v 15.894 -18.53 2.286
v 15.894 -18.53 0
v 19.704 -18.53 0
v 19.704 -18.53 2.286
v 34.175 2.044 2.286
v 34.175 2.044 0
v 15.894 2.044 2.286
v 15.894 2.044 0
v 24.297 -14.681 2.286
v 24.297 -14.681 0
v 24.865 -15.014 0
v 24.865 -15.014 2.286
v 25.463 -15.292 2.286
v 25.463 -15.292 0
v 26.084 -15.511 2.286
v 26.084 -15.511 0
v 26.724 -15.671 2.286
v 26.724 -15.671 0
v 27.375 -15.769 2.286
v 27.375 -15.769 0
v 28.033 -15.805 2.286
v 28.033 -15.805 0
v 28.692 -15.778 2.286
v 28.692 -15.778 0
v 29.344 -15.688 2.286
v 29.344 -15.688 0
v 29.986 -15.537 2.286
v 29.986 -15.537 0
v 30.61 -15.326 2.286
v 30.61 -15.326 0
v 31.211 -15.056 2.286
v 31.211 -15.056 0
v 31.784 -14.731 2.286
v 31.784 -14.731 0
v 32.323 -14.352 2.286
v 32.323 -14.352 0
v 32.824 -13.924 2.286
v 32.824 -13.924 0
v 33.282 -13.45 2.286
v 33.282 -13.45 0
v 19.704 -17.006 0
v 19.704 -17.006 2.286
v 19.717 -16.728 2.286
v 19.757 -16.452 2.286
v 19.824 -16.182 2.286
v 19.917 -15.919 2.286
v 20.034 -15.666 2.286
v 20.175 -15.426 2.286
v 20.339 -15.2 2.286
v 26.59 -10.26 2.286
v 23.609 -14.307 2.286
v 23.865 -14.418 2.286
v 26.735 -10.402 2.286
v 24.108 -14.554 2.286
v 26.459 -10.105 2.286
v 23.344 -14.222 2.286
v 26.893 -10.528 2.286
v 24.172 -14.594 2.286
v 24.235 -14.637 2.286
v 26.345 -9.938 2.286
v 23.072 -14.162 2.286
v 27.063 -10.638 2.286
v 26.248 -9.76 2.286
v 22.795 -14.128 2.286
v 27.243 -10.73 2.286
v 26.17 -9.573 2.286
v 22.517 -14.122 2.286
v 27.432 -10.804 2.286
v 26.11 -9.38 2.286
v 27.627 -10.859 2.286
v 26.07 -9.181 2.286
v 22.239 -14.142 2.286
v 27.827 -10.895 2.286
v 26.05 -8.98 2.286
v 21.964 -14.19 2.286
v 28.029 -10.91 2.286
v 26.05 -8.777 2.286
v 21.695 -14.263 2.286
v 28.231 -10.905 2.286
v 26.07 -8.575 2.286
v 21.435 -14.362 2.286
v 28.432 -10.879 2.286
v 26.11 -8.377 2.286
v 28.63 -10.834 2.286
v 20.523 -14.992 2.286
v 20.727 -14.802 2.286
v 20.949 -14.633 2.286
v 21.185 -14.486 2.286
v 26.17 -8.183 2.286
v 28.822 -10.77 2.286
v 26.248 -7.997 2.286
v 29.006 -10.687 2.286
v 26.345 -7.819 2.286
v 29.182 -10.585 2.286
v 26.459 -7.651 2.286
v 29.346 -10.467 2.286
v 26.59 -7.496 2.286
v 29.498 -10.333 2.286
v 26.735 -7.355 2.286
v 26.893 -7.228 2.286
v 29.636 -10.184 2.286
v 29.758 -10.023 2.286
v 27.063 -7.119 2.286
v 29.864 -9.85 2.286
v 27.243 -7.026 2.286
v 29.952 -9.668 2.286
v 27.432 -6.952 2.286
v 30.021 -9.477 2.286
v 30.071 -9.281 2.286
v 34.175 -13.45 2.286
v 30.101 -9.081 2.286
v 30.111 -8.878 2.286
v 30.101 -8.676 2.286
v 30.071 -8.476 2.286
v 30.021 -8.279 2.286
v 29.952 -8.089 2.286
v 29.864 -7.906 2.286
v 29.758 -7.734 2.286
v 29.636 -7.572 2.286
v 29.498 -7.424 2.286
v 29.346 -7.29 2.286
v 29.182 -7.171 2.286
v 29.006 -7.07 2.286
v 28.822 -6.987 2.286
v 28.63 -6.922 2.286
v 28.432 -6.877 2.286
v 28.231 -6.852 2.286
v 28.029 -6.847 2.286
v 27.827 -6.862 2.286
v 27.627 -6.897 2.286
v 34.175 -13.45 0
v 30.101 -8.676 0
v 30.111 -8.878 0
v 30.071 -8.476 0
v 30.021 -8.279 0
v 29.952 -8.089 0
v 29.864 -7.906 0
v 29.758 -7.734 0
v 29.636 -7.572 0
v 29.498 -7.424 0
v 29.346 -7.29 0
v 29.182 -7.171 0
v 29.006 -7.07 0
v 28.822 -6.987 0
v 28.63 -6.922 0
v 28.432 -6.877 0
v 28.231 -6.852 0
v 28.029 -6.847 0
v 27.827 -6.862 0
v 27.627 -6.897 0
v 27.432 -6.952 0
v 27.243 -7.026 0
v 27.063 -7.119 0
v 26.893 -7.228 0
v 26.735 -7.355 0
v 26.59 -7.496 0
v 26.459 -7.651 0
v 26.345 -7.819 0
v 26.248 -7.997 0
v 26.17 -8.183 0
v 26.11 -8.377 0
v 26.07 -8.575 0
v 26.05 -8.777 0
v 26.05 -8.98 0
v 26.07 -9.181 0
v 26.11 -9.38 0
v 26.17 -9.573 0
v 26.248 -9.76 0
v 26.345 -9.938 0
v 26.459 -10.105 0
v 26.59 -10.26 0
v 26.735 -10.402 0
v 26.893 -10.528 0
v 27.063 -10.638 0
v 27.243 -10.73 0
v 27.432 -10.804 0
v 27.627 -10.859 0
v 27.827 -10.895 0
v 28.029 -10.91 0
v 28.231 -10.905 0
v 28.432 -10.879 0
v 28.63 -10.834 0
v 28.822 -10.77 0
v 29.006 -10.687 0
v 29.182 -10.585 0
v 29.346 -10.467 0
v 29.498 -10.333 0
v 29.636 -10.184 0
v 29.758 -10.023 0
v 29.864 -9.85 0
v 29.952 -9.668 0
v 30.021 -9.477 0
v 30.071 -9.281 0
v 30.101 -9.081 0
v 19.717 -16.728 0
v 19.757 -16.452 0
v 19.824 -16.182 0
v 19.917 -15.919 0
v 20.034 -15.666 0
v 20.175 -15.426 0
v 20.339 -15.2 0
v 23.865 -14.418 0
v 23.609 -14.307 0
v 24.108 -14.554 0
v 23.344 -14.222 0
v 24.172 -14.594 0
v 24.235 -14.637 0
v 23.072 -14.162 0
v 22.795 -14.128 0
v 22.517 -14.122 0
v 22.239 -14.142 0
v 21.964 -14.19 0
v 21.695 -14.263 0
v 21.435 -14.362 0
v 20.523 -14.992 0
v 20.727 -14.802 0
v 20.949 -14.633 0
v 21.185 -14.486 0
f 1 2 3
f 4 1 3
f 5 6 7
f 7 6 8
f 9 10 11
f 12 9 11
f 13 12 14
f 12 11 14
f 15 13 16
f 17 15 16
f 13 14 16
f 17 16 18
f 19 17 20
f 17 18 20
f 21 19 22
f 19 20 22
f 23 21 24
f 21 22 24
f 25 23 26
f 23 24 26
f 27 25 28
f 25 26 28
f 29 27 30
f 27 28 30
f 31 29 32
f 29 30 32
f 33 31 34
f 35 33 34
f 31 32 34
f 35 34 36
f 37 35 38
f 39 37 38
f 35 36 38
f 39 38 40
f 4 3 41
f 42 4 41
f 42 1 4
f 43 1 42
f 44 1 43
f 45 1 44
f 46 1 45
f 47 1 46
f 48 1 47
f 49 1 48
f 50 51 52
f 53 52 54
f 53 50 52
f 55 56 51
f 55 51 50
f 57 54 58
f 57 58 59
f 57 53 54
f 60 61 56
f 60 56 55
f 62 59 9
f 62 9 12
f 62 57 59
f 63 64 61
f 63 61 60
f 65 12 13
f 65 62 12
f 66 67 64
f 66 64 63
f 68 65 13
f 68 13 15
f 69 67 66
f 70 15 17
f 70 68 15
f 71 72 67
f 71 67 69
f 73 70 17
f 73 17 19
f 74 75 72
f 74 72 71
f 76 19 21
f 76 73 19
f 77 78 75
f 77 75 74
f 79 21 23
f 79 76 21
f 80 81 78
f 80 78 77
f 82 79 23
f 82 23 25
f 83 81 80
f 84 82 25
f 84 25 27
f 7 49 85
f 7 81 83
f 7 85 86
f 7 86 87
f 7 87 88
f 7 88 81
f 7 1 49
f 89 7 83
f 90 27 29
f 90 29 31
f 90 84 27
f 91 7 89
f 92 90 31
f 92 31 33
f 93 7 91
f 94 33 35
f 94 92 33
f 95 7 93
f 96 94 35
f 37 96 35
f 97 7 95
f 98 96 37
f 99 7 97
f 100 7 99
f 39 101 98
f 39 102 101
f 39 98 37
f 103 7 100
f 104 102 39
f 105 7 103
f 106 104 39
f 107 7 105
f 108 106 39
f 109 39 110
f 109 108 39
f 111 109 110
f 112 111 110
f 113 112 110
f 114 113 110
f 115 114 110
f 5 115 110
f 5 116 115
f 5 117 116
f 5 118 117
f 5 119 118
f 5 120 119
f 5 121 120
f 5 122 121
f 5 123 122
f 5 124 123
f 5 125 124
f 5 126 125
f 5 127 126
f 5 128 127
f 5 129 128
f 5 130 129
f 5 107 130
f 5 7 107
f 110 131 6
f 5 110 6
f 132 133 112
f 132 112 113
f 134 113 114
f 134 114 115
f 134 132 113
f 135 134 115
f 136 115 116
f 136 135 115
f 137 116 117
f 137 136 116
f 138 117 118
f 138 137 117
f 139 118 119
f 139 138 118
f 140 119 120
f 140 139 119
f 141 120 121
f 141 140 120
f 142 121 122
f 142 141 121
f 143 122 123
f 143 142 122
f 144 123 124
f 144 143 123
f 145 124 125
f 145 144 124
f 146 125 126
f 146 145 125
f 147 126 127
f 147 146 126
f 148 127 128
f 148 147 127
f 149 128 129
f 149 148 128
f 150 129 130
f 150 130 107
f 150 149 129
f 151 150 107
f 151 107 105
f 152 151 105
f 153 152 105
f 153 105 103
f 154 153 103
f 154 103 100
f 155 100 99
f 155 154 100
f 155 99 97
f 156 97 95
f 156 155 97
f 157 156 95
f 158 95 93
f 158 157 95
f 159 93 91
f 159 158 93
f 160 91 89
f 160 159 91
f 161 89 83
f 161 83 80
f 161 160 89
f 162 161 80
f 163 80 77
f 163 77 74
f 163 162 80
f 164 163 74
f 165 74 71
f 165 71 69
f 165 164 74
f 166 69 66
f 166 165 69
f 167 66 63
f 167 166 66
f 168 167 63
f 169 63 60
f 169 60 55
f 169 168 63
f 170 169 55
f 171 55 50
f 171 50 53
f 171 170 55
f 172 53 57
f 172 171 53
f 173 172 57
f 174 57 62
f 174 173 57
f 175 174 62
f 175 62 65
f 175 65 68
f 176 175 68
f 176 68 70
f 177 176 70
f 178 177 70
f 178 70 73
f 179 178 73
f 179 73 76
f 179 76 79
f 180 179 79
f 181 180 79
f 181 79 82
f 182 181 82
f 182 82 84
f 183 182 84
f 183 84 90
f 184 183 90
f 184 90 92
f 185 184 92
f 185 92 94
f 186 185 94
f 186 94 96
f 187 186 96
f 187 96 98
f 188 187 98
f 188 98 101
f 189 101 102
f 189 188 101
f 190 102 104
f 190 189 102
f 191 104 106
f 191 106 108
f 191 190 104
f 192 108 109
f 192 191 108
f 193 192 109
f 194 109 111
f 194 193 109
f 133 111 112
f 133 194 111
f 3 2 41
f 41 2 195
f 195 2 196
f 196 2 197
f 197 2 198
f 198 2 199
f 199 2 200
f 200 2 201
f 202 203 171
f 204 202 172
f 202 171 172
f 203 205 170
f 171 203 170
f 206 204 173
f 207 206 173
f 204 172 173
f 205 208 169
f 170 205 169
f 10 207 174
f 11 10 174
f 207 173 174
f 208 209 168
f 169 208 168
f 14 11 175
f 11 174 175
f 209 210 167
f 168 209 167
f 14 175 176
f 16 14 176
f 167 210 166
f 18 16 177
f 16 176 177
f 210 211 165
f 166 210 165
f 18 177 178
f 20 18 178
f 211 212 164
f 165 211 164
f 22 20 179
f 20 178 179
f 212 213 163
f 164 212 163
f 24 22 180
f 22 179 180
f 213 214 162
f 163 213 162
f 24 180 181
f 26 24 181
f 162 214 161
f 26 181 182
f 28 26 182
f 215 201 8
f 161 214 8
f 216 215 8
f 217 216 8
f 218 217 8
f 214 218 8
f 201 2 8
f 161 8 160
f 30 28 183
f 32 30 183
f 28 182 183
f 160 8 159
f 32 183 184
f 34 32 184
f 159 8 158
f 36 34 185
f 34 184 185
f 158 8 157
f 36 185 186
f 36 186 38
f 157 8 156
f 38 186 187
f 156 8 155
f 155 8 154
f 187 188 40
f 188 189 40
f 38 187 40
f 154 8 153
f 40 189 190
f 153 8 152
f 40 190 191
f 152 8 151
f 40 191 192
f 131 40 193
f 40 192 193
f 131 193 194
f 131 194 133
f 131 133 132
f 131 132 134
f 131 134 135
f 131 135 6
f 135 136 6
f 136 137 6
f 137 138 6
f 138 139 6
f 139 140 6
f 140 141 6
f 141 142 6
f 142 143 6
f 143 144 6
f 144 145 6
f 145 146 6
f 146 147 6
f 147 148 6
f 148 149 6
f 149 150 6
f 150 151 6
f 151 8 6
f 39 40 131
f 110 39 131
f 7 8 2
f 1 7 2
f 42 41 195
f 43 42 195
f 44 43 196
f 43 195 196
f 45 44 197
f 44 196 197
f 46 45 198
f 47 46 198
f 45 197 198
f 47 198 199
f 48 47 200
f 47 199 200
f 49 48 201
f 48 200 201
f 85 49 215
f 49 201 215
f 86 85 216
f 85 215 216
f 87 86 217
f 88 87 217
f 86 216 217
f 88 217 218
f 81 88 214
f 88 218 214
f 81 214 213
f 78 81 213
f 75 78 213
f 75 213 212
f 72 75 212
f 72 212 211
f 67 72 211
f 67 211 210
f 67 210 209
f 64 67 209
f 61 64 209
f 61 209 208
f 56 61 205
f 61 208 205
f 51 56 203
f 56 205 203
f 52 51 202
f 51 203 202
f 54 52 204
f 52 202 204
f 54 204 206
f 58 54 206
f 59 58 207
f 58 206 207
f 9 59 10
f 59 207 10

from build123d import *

# Parameters (mm, degrees)
F0_R     = 2.032
F1_DEPTH = 2.286


with BuildPart() as f1:
    # F0 (on Top) → F1 (new body)
    with BuildSketch(Plane.XY):
        with BuildLine():
            Line((34.175198, -8.878299), (34.175198, 2.043701))
            Line((34.175198, 2.043701), (15.893778, 2.043701))
            Line((15.893778, 2.043701), (15.893778, -13.450299))
            Line((15.893778, -13.450299), (15.893778, -18.530299))
            Line((15.893778, -18.530299), (19.703778, -18.530299))
            Line((19.703778, -18.530299), (19.703778, -17.006299))
            ThreePointArc((19.703778, -17.006299), (21.185336, -14.485536), (24.108456, -14.553586))
            ThreePointArc((24.108456, -14.553586), (24.203978, -14.6154), (24.296988, -14.680933))
            ThreePointArc((24.296988, -14.680933), (29.019072, -15.740683), (33.282321, -13.450299))
            Line((33.282321, -13.450299), (34.175198, -13.450299))
            Line((34.175198, -13.450299), (34.175198, -8.878299))
        make_face()
        with Locations((28.079198, -8.878299)):
            Circle(F0_R, mode=Mode.SUBTRACT)
    extrude(amount=F1_DEPTH)


solid = f1.part
